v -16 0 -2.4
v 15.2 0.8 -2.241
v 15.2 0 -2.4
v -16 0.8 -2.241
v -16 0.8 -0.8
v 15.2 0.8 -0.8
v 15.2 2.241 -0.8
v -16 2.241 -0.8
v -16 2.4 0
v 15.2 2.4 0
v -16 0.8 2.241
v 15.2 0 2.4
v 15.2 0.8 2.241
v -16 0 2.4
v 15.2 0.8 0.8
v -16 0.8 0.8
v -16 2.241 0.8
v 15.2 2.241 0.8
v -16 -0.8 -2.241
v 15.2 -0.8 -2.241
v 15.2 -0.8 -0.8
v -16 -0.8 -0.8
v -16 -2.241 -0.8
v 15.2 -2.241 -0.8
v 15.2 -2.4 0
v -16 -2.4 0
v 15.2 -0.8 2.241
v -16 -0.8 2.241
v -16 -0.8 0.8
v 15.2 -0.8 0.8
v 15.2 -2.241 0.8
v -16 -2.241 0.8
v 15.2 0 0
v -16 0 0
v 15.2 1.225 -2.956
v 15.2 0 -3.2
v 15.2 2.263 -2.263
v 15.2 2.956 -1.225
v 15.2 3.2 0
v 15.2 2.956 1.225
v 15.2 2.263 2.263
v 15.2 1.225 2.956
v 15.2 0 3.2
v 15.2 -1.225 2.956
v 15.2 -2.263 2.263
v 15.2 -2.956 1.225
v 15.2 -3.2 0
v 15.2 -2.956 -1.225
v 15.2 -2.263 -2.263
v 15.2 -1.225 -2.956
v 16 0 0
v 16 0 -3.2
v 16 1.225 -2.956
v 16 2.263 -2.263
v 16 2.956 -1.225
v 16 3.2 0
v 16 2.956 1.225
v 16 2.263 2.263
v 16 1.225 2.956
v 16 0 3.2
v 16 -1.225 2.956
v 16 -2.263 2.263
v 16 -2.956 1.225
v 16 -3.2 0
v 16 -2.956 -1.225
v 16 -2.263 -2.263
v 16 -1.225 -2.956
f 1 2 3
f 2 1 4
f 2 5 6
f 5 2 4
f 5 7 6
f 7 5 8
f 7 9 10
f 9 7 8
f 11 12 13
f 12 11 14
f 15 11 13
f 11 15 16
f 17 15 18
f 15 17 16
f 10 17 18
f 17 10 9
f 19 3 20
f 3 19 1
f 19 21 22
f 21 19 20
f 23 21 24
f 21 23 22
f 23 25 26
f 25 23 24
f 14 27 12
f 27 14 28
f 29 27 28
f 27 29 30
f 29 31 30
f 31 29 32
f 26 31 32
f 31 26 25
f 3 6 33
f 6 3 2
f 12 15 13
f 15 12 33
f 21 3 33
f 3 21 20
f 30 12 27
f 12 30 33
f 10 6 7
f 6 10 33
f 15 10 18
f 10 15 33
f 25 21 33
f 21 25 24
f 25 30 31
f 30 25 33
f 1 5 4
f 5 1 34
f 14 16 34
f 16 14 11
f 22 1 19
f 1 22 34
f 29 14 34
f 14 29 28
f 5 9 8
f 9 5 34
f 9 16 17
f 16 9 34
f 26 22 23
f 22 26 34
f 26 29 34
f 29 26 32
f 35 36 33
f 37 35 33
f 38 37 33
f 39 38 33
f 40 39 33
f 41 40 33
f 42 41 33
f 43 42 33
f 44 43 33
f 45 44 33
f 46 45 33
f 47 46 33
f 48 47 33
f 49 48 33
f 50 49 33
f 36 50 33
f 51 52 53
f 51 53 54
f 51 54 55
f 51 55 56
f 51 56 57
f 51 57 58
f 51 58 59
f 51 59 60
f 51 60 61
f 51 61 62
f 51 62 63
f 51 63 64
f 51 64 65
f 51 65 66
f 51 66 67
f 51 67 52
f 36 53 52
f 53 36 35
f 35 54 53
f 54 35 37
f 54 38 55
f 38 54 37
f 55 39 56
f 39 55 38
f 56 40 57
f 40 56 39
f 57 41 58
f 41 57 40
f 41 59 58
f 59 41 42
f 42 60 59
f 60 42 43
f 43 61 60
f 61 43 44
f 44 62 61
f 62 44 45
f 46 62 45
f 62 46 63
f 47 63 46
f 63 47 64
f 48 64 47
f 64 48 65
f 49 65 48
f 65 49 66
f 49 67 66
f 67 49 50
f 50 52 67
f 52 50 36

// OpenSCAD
// file: ../p/stud3.scad
use <../lib.scad>
use <4-4cyli.scad>
use <4-4disc.scad>
use <4-4edge.scad>
$fa=1; $fs=0.2;
function ldraw_lib__stud3(realsolid=false) = realsolid ? 
    [openscad(translate([0,0,-eps()], o=cylinder(4+eps(), r=4)),2)] : [
// 0 Stud Tube Solid
// 0 Name: stud3.dat
// 0 Author: James Jessiman
// 0 !LDRAW_ORG Primitive UPDATE 2012-01
// 0 !LICENSE Licensed under CC BY 2.0 and CC BY 4.0 : see CAreadme.txt
// 
// 0 BFC CERTIFY CCW
  [0,"BFC","CERTIFY"],
  [0,"BFC","CCW"],
// 
// 0 !HISTORY 2002-04-04 [sbliss] Modified for BFC compliance
// 0 !HISTORY 2002-04-25 [PTadmin] Official Update 2002-02
// 0 !HISTORY 2007-06-24 [PTadmin] Header formatted for Contributor Agreement
// 0 !HISTORY 2008-07-01 [PTadmin] Official Update 2008-01
// 0 !HISTORY 2012-02-16 [Philo] Changed to CCW
// 0 !HISTORY 2012-03-30 [PTadmin] Official Update 2012-01
// 
// 
// 1 16 0 -4 0 4 0 0 0 1 0 0 0 4 4-4edge.dat
  [1,16,0,-4,0,4,0,0,0,1,0,0,0,4, ldraw_lib__4_4edge(realsolid)],
// 1 16 0 0 0 4 0 0 0 1 0 0 0 4 4-4edge.dat
  [1,16,0,0,0,4,0,0,0,1,0,0,0,4, ldraw_lib__4_4edge(realsolid)],
// 1 16 0 -4 0 4 0 0 0 1 0 0 0 4 4-4disc.dat
  [1,16,0,-4,0,4,0,0,0,1,0,0,0,4, ldraw_lib__4_4disc(realsolid)],
// 1 16 0 -4 0 4 0 0 0 4 0 0 0 4 4-4cyli.dat
  [1,16,0,-4,0,4,0,0,0,4,0,0,0,4, ldraw_lib__4_4cyli(realsolid)],
];
module ldraw_lib__stud3(step=0, col=false, unit=2/5, alt=false, line=0.2, solid=!$preview)
    makepoly(ldraw_lib__stud3(solid), step=step, col=col, unit=unit, alt=alt, line=line, solid=solid);
ldraw_lib__stud3(line=0.2);
// file: ../p/stud.scad
use <../lib.scad>
use <4-4cyli.scad>
use <4-4disc.scad>
use <4-4edge.scad>
$fa=1; $fs=0.2;
function ldraw_lib__stud(realsolid=false) = realsolid ? 
    [openscad(translate([0,0,-eps()], o=cylinder(4+eps(), r=6)),2)] : [
// 0 Stud
// 0 Name: stud.dat
// 0 Author: James Jessiman
// 0 !LDRAW_ORG Primitive UPDATE 2012-01
// 0 !LICENSE Licensed under CC BY 2.0 and CC BY 4.0 : see CAreadme.txt
// 
// 0 BFC CERTIFY CCW
  [0,"BFC","CERTIFY"],
  [0,"BFC","CCW"],
// 
// 0 !HISTORY 2002-04-04 [sbliss] Modified for BFC compliance
// 0 !HISTORY 2002-04-25 [PTadmin] Official Update 2002-02
// 0 !HISTORY 2007-06-24 [PTadmin] Header formatted for Contributor Agreement
// 0 !HISTORY 2008-07-01 [PTadmin] Official Update 2008-01
// 0 !HISTORY 2012-02-16 [Philo] Changed to CCW
// 0 !HISTORY 2012-03-30 [PTadmin] Official Update 2012-01
// 
// 
// 1 16 0 0 0 6 0 0 0 1 0 0 0 6 4-4edge.dat
  [1,16,0,0,0,6,0,0,0,1,0,0,0,6, ldraw_lib__4_4edge(realsolid)],
// 1 16 0 -4 0 6 0 0 0 1 0 0 0 6 4-4edge.dat
  [1,16,0,-4,0,6,0,0,0,1,0,0,0,6, ldraw_lib__4_4edge(realsolid)],
// 1 16 0 0 0 6 0 0 0 -4 0 0 0 6 4-4cyli.dat
  [1,16,0,0,0,6,0,0,0,-4,0,0,0,6, ldraw_lib__4_4cyli(realsolid)],
// 1 16 0 -4 0 6 0 0 0 1 0 0 0 6 4-4disc.dat
  [1,16,0,-4,0,6,0,0,0,1,0,0,0,6, ldraw_lib__4_4disc(realsolid)],
];
module ldraw_lib__stud(step=0, col=false, unit=2/5, alt=false, line=0.2, solid=!$preview)
    makepoly(ldraw_lib__stud(solid), step=step, col=col, unit=unit, alt=alt, line=line, solid=solid);
ldraw_lib__stud(line=0.2);
// file: ../p/box5.scad
use <../lib.scad>
$fa=1; $fs=0.2;
function ldraw_lib__box5(realsolid=false) = [
// 0 Box with 5 Faces and All Edges
// 0 Name: box5.dat
// 0 Author: James Jessiman
// 0 !LDRAW_ORG Primitive UPDATE 2012-01
// 0 !LICENSE Licensed under CC BY 2.0 and CC BY 4.0 : see CAreadme.txt
// 
// 0 BFC CERTIFY CCW
  [0,"BFC","CERTIFY"],
  [0,"BFC","CCW"],
// 
// 0 !HISTORY 2002-04-03 [sbliss] Modified for BFC compliance
// 0 !HISTORY 2002-04-25 [PTadmin] Official Update 2002-02
// 0 !HISTORY 2007-06-24 [PTadmin] Header formatted for Contributor Agreement
// 0 !HISTORY 2008-07-01 [PTadmin] Official Update 2008-01
// 0 !HISTORY 2012-02-16 [Philo] Changed to CCW
// 0 !HISTORY 2012-03-30 [PTadmin] Official Update 2012-01
// 
// 
// 2 24 1 1 1 -1 1 1
  [2,24,1,1,1,-1,1,1],
// 2 24 -1 1 1 -1 1 -1
  [2,24,-1,1,1,-1,1,-1],
// 2 24 -1 1 -1 1 1 -1
  [2,24,-1,1,-1,1,1,-1],
// 2 24 1 1 -1 1 1 1
  [2,24,1,1,-1,1,1,1],
// 2 24 1 0 1 -1 0 1
  [2,24,1,0,1,-1,0,1],
// 2 24 -1 0 1 -1 0 -1
  [2,24,-1,0,1,-1,0,-1],
// 2 24 -1 0 -1 1 0 -1
  [2,24,-1,0,-1,1,0,-1],
// 2 24 1 0 -1 1 0 1
  [2,24,1,0,-1,1,0,1],
// 2 24 1 0 1 1 1 1
  [2,24,1,0,1,1,1,1],
// 2 24 -1 0 1 -1 1 1
  [2,24,-1,0,1,-1,1,1],
// 2 24 1 0 -1 1 1 -1
  [2,24,1,0,-1,1,1,-1],
// 2 24 -1 0 -1 -1 1 -1
  [2,24,-1,0,-1,-1,1,-1],
// 4 16 -1 1 1 1 1 1 1 1 -1 -1 1 -1
  [4,16,-1,1,1,1,1,1,1,1,-1,-1,1,-1],
// 4 16 -1 1 1 -1 0 1 1 0 1 1 1 1
  [4,16,-1,1,1,-1,0,1,1,0,1,1,1,1],
// 4 16 -1 1 -1 -1 0 -1 -1 0 1 -1 1 1
  [4,16,-1,1,-1,-1,0,-1,-1,0,1,-1,1,1],
// 4 16 1 1 -1 1 0 -1 -1 0 -1 -1 1 -1
  [4,16,1,1,-1,1,0,-1,-1,0,-1,-1,1,-1],
// 4 16 1 1 1 1 0 1 1 0 -1 1 1 -1
  [4,16,1,1,1,1,0,1,1,0,-1,1,1,-1],
];
module ldraw_lib__box5(step=0, col=false, unit=2/5, alt=false, line=0.2, solid=!$preview)
    makepoly(ldraw_lib__box5(solid), step=step, col=col, unit=unit, alt=alt, line=line, solid=solid);
ldraw_lib__box5(line=0.2);
// file: ../p/box4t.scad
use <../lib.scad>
$fa=1; $fs=0.2;
function ldraw_lib__box4t(realsolid=false) = [
// 0 Box with 4 Adjacent Faces and All Edges
// 0 Name: box4t.dat
// 0 Author: Tore Eriksson [Tore_Eriksson]
// 0 !LDRAW_ORG Primitive UPDATE 2003-02
// 0 !LICENSE Licensed under CC BY 2.0 and CC BY 4.0 : see CAreadme.txt
// 
// 0 BFC CERTIFY CCW
  [0,"BFC","CERTIFY"],
  [0,"BFC","CCW"],
// 
// 0 !HISTORY 1997-09-29 [PTadmin] Official Update 1997-15
// 0 !HISTORY 2002-08-31 [izanette] Modified with WINDZ for BFC compliance
// 0 !HISTORY 2003-08-01 [PTadmin] Official Update 2003-02
// 0 !HISTORY 2007-06-24 [PTadmin] Header formatted for Contributor Agreement
// 0 !HISTORY 2008-07-01 [PTadmin] Official Update 2008-01
// 
// 
// 2 24 1 1 1 -1 1 1
  [2,24,1,1,1,-1,1,1],
// 2 24 -1 1 1 -1 1 -1
  [2,24,-1,1,1,-1,1,-1],
// 2 24 -1 1 -1 1 1 -1
  [2,24,-1,1,-1,1,1,-1],
// 2 24 1 1 -1 1 1 1
  [2,24,1,1,-1,1,1,1],
// 2 24 1 0 1 -1 0 1
  [2,24,1,0,1,-1,0,1],
// 2 24 -1 0 1 -1 0 -1
  [2,24,-1,0,1,-1,0,-1],
// 2 24 -1 0 -1 1 0 -1
  [2,24,-1,0,-1,1,0,-1],
// 2 24 1 0 -1 1 0 1
  [2,24,1,0,-1,1,0,1],
// 2 24 1 0 1 1 1 1
  [2,24,1,0,1,1,1,1],
// 2 24 -1 0 1 -1 1 1
  [2,24,-1,0,1,-1,1,1],
// 2 24 1 0 -1 1 1 -1
  [2,24,1,0,-1,1,1,-1],
// 2 24 -1 0 -1 -1 1 -1
  [2,24,-1,0,-1,-1,1,-1],
// 4 16 1 1 1 1 1 -1 -1 1 -1 -1 1 1
  [4,16,1,1,1,1,1,-1,-1,1,-1,-1,1,1],
// 4 16 1 1 1 -1 1 1 -1 0 1 1 0 1
  [4,16,1,1,1,-1,1,1,-1,0,1,1,0,1],
// 4 16 -1 1 1 -1 1 -1 -1 0 -1 -1 0 1
  [4,16,-1,1,1,-1,1,-1,-1,0,-1,-1,0,1],
// 0 4 16 -1 1 -1 -1 0 -1 1 0 -1 1 1 -1
// 4 16 1 1 -1 1 1 1 1 0 1 1 0 -1
  [4,16,1,1,-1,1,1,1,1,0,1,1,0,-1],
// 0
];
module ldraw_lib__box4t(step=0, col=false, unit=2/5, alt=false, line=0.2, solid=!$preview)
    makepoly(ldraw_lib__box4t(solid), step=step, col=col, unit=unit, alt=alt, line=line, solid=solid);
ldraw_lib__box4t(line=0.2);
// file: s/3004s01.scad
use <../../lib.scad>
use <../../p/box4t.scad>
use <../../p/box5.scad>
use <../../p/stud.scad>
use <../../p/stud3.scad>
$fa=1; $fs=0.2;
function ldraw_lib__s__3004s01(realsolid=false) = [
// 0 ~Brick  1 x  2 without Front Face
// 0 Name: s\3004s01.dat
// 0 Author: James Jessiman
// 0 !LDRAW_ORG Subpart UPDATE 2003-03
// 0 !LICENSE Licensed under CC BY 2.0 and CC BY 4.0 : see CAreadme.txt
// 
// 0 BFC CERTIFY CCW
  [0,"BFC","CERTIFY"],
  [0,"BFC","CCW"],
// 
// 0 !HISTORY 2003-09-07 [jriley] Subfiling, BFC
// 0 !HISTORY 2003-12-19 [PTadmin] Official Update 2003-03
// 0 !HISTORY 2007-08-29 [PTadmin] Header formatted for Contributor Agreement
// 0 !HISTORY 2008-07-01 [PTadmin] Official Update 2008-01
// 
// 
// 1 16 0 4 0 1 0 0 0 -5 0 0 0 1 stud3.dat
  [1,16,0,4,0,1,0,0,0,-5,0,0,0,1, ldraw_lib__stud3(realsolid)],
// 0 BFC INVERTNEXT
  [0,"BFC","INVERTNEXT"],
// 1 16 0 24 0 16 0 0 0 -20 0 0 0 6 box5.dat
  [1,16,0,24,0,16,0,0,0,-20,0,0,0,6, ldraw_lib__box5(realsolid)],
// 4 16 20 24 10 16 24 6 -16 24 6 -20 24 10
  [4,16,20,24,10,16,24,6,-16,24,6,-20,24,10],
// 4 16 -20 24 10 -16 24 6 -16 24 -6 -20 24 -10
  [4,16,-20,24,10,-16,24,6,-16,24,-6,-20,24,-10],
// 4 16 -20 24 -10 -16 24 -6 16 24 -6 20 24 -10
  [4,16,-20,24,-10,-16,24,-6,16,24,-6,20,24,-10],
// 4 16 20 24 -10 16 24 -6 16 24 6 20 24 10
  [4,16,20,24,-10,16,24,-6,16,24,6,20,24,10],
// 1 16 0 24 0 20 0 0 0 -24 0 0 0 10 box4t.dat
  [1,16,0,24,0,20,0,0,0,-24,0,0,0,10, ldraw_lib__box4t(realsolid)],
// 1 16 10 0 0 1 0 0 0 1 0 0 0 1 stud.dat
  [1,16,10,0,0,1,0,0,0,1,0,0,0,1, ldraw_lib__stud(realsolid)],
// 1 16 -10 0 0 1 0 0 0 1 0 0 0 1 stud.dat
  [1,16,-10,0,0,1,0,0,0,1,0,0,0,1, ldraw_lib__stud(realsolid)],
// 0
];
module ldraw_lib__s__3004s01(step=0, col=false, unit=2/5, alt=false, line=0.2, solid=!$preview)
    makepoly(ldraw_lib__s__3004s01(solid), step=step, col=col, unit=unit, alt=alt, line=line, solid=solid);
ldraw_lib__s__3004s01(line=0.2);
// file: ../p/4-4edge.scad
use <../lib.scad>
$fa=1; $fs=0.2;
function ldraw_lib__4_4edge(realsolid=false) = [
// 0 Circle 1.0
// 0 Name: 4-4edge.dat
// 0 Author: James Jessiman
// 0 !LDRAW_ORG Primitive UPDATE 2017-01
// 0 !LICENSE Licensed under CC BY 2.0 and CC BY 4.0 : see CAreadme.txt
// 
// 0 BFC CERTIFY CCW
  [0,"BFC","CERTIFY"],
  [0,"BFC","CCW"],
// 
// 0 !HISTORY 1998-12-15 [PTadmin] Official Update 1998-10
// 0 !HISTORY 2005-12-28 [PTadmin] Official Update 2005-01
// 0 !HISTORY 2007-06-24 [PTadmin] Header formatted for Contributor Agreement
// 0 !HISTORY 2008-07-01 [PTadmin] Official Update 2008-01
// 0 !HISTORY 2017-01-15 [Steffen] BFCed
// 0 !HISTORY 2017-12-30 [PTadmin] Official Update 2017-01
// 
// 
// 2 24 1 0 0 0.9239 0 0.3827
  [2,24,1,0,0,0.9239,0,0.3827],
// 2 24 0.9239 0 0.3827 0.7071 0 0.7071
  [2,24,0.9239,0,0.3827,0.7071,0,0.7071],
// 2 24 0.7071 0 0.7071 0.3827 0 0.9239
  [2,24,0.7071,0,0.7071,0.3827,0,0.9239],
// 2 24 0.3827 0 0.9239 0 0 1
  [2,24,0.3827,0,0.9239,0,0,1],
// 2 24 0 0 1 -0.3827 0 0.9239
  [2,24,0,0,1,-0.3827,0,0.9239],
// 2 24 -0.3827 0 0.9239 -0.7071 0 0.7071
  [2,24,-0.3827,0,0.9239,-0.7071,0,0.7071],
// 2 24 -0.7071 0 0.7071 -0.9239 0 0.3827
  [2,24,-0.7071,0,0.7071,-0.9239,0,0.3827],
// 2 24 -0.9239 0 0.3827 -1 0 -0
  [2,24,-0.9239,0,0.3827,-1,0,-0],
// 2 24 -1 0 -0 -0.9239 0 -0.3827
  [2,24,-1,0,-0,-0.9239,0,-0.3827],
// 2 24 -0.9239 0 -0.3827 -0.7071 0 -0.7071
  [2,24,-0.9239,0,-0.3827,-0.7071,0,-0.7071],
// 2 24 -0.7071 0 -0.7071 -0.3827 0 -0.9239
  [2,24,-0.7071,0,-0.7071,-0.3827,0,-0.9239],
// 2 24 -0.3827 0 -0.9239 0 0 -1
  [2,24,-0.3827,0,-0.9239,0,0,-1],
// 2 24 0 0 -1 0.3827 0 -0.9239
  [2,24,0,0,-1,0.3827,0,-0.9239],
// 2 24 0.3827 0 -0.9239 0.7071 0 -0.7071
  [2,24,0.3827,0,-0.9239,0.7071,0,-0.7071],
// 2 24 0.7071 0 -0.7071 0.9239 0 -0.3827
  [2,24,0.7071,0,-0.7071,0.9239,0,-0.3827],
// 2 24 0.9239 0 -0.3827 1 0 0
  [2,24,0.9239,0,-0.3827,1,0,0],
];
module ldraw_lib__4_4edge(step=0, col=false, unit=2/5, alt=false, line=0.2, solid=!$preview)
    makepoly(ldraw_lib__4_4edge(solid), step=step, col=col, unit=unit, alt=alt, line=line, solid=solid);
ldraw_lib__4_4edge(line=0.2);
// file: ../p/4-4cyli.scad
use <../lib.scad>
$fa=1; $fs=0.2;
function ldraw_lib__4_4cyli(realsolid=false) = [
// 0 Cylinder 1.0
// 0 Name: 4-4cyli.dat
// 0 Author: James Jessiman
// 0 !LDRAW_ORG Primitive UPDATE 2005-01
// 0 !LICENSE Licensed under CC BY 2.0 and CC BY 4.0 : see CAreadme.txt
// 
// 0 BFC CERTIFY CCW
  [0,"BFC","CERTIFY"],
  [0,"BFC","CCW"],
// 
// 0 !HISTORY 1998-12-15 [PTadmin] Official Update 1998-10
// 0 !HISTORY 2002-03-23 [sbliss] Added BFC statement; merged headers from files in distributions LDraw 0.27 and Complete.
// 0 !HISTORY 2002-04-25 [PTadmin] Official Update 2002-02
// 0 !HISTORY 2004-12-14 [guyvivan] BFC CCW
// 0 !HISTORY 2005-12-28 [PTadmin] Official Update 2005-01
// 0 !HISTORY 2007-06-24 [PTadmin] Header formatted for Contributor Agreement
// 0 !HISTORY 2008-07-01 [PTadmin] Official Update 2008-01
// 
// 
// 4 16 1 1 0 0.9239 1 0.3827 0.9239 0 0.3827 1 0 0
  [4,16,1,1,0,0.9239,1,0.3827,0.9239,0,0.3827,1,0,0],
// 5 24 1 0 0 1 1 0 0.9239 0 0.3827 0.9239 0 -0.3827
  [5,24,1,0,0,1,1,0,0.9239,0,0.3827,0.9239,0,-0.3827],
// 4 16 0.9239 1 0.3827 0.7071 1 0.7071 0.7071 0 0.7071 0.9239 0 0.3827
  [4,16,0.9239,1,0.3827,0.7071,1,0.7071,0.7071,0,0.7071,0.9239,0,0.3827],
// 5 24 0.9239 0 0.3827 0.9239 1 0.3827 0.7071 0 0.7071 1 0 0
  [5,24,0.9239,0,0.3827,0.9239,1,0.3827,0.7071,0,0.7071,1,0,0],
// 4 16 0.7071 1 0.7071 0.3827 1 0.9239 0.3827 0 0.9239 0.7071 0 0.7071
  [4,16,0.7071,1,0.7071,0.3827,1,0.9239,0.3827,0,0.9239,0.7071,0,0.7071],
// 5 24 0.7071 0 0.7071 0.7071 1 0.7071 0.3827 0 0.9239 0.9239 0 0.3827
  [5,24,0.7071,0,0.7071,0.7071,1,0.7071,0.3827,0,0.9239,0.9239,0,0.3827],
// 4 16 0.3827 1 0.9239 0 1 1 0 0 1 0.3827 0 0.9239
  [4,16,0.3827,1,0.9239,0,1,1,0,0,1,0.3827,0,0.9239],
// 5 24 0.3827 0 0.9239 0.3827 1 0.9239 0 0 1 0.7071 0 0.7071
  [5,24,0.3827,0,0.9239,0.3827,1,0.9239,0,0,1,0.7071,0,0.7071],
// 4 16 0 1 1 -0.3827 1 0.9239 -0.3827 0 0.9239 0 0 1
  [4,16,0,1,1,-0.3827,1,0.9239,-0.3827,0,0.9239,0,0,1],
// 5 24 0 0 1 0 1 1 -0.3827 0 0.9239 0.3827 0 0.9239
  [5,24,0,0,1,0,1,1,-0.3827,0,0.9239,0.3827,0,0.9239],
// 4 16 -0.3827 1 0.9239 -0.7071 1 0.7071 -0.7071 0 0.7071 -0.3827 0 0.9239
  [4,16,-0.3827,1,0.9239,-0.7071,1,0.7071,-0.7071,0,0.7071,-0.3827,0,0.9239],
// 5 24 -0.3827 0 0.9239 -0.3827 1 0.9239 -0.7071 0 0.7071 0 0 1
  [5,24,-0.3827,0,0.9239,-0.3827,1,0.9239,-0.7071,0,0.7071,0,0,1],
// 4 16 -0.7071 1 0.7071 -0.9239 1 0.3827 -0.9239 0 0.3827 -0.7071 0 0.7071
  [4,16,-0.7071,1,0.7071,-0.9239,1,0.3827,-0.9239,0,0.3827,-0.7071,0,0.7071],
// 5 24 -0.7071 0 0.7071 -0.7071 1 0.7071 -0.9239 0 0.3827 -0.3827 0 0.9239
  [5,24,-0.7071,0,0.7071,-0.7071,1,0.7071,-0.9239,0,0.3827,-0.3827,0,0.9239],
// 4 16 -0.9239 1 0.3827 -1 1 0 -1 0 0 -0.9239 0 0.3827
  [4,16,-0.9239,1,0.3827,-1,1,0,-1,0,0,-0.9239,0,0.3827],
// 5 24 -0.9239 0 0.3827 -0.9239 1 0.3827 -1 0 0 -0.7071 0 0.7071
  [5,24,-0.9239,0,0.3827,-0.9239,1,0.3827,-1,0,0,-0.7071,0,0.7071],
// 4 16 -1 1 0 -0.9239 1 -0.3827 -0.9239 0 -0.3827 -1 0 0
  [4,16,-1,1,0,-0.9239,1,-0.3827,-0.9239,0,-0.3827,-1,0,0],
// 5 24 -1 0 0 -1 1 0 -0.9239 0 -0.3827 -0.9239 0 0.3827
  [5,24,-1,0,0,-1,1,0,-0.9239,0,-0.3827,-0.9239,0,0.3827],
// 4 16 -0.9239 1 -0.3827 -0.7071 1 -0.7071 -0.7071 0 -0.7071 -0.9239 0 -0.3827
  [4,16,-0.9239,1,-0.3827,-0.7071,1,-0.7071,-0.7071,0,-0.7071,-0.9239,0,-0.3827],
// 5 24 -0.9239 0 -0.3827 -0.9239 1 -0.3827 -0.7071 0 -0.7071 -1 0 0
  [5,24,-0.9239,0,-0.3827,-0.9239,1,-0.3827,-0.7071,0,-0.7071,-1,0,0],
// 4 16 -0.7071 1 -0.7071 -0.3827 1 -0.9239 -0.3827 0 -0.9239 -0.7071 0 -0.7071
  [4,16,-0.7071,1,-0.7071,-0.3827,1,-0.9239,-0.3827,0,-0.9239,-0.7071,0,-0.7071],
// 5 24 -0.7071 0 -0.7071 -0.7071 1 -0.7071 -0.3827 0 -0.9239 -0.9239 0 -0.3827
  [5,24,-0.7071,0,-0.7071,-0.7071,1,-0.7071,-0.3827,0,-0.9239,-0.9239,0,-0.3827],
// 4 16 -0.3827 1 -0.9239 0 1 -1 0 0 -1 -0.3827 0 -0.9239
  [4,16,-0.3827,1,-0.9239,0,1,-1,0,0,-1,-0.3827,0,-0.9239],
// 5 24 -0.3827 0 -0.9239 -0.3827 1 -0.9239 0 0 -1 -0.7071 0 -0.7071
  [5,24,-0.3827,0,-0.9239,-0.3827,1,-0.9239,0,0,-1,-0.7071,0,-0.7071],
// 4 16 0 1 -1 0.3827 1 -0.9239 0.3827 0 -0.9239 0 0 -1
  [4,16,0,1,-1,0.3827,1,-0.9239,0.3827,0,-0.9239,0,0,-1],
// 5 24 0 0 -1 0 1 -1 0.3827 0 -0.9239 -0.3827 0 -0.9239
  [5,24,0,0,-1,0,1,-1,0.3827,0,-0.9239,-0.3827,0,-0.9239],
// 4 16 0.3827 1 -0.9239 0.7071 1 -0.7071 0.7071 0 -0.7071 0.3827 0 -0.9239
  [4,16,0.3827,1,-0.9239,0.7071,1,-0.7071,0.7071,0,-0.7071,0.3827,0,-0.9239],
// 5 24 0.3827 0 -0.9239 0.3827 1 -0.9239 0.7071 0 -0.7071 0 0 -1
  [5,24,0.3827,0,-0.9239,0.3827,1,-0.9239,0.7071,0,-0.7071,0,0,-1],
// 4 16 0.7071 1 -0.7071 0.9239 1 -0.3827 0.9239 0 -0.3827 0.7071 0 -0.7071
  [4,16,0.7071,1,-0.7071,0.9239,1,-0.3827,0.9239,0,-0.3827,0.7071,0,-0.7071],
// 5 24 0.7071 0 -0.7071 0.7071 1 -0.7071 0.9239 0 -0.3827 0.3827 0 -0.9239
  [5,24,0.7071,0,-0.7071,0.7071,1,-0.7071,0.9239,0,-0.3827,0.3827,0,-0.9239],
// 4 16 0.9239 1 -0.3827 1 1 0 1 0 0 0.9239 0 -0.3827
  [4,16,0.9239,1,-0.3827,1,1,0,1,0,0,0.9239,0,-0.3827],
// 5 24 0.9239 0 -0.3827 0.9239 1 -0.3827 1 0 0 0.7071 0 -0.7071
  [5,24,0.9239,0,-0.3827,0.9239,1,-0.3827,1,0,0,0.7071,0,-0.7071],
// 0
];
module ldraw_lib__4_4cyli(step=0, col=false, unit=2/5, alt=false, line=0.2, solid=!$preview)
    makepoly(ldraw_lib__4_4cyli(solid), step=step, col=col, unit=unit, alt=alt, line=line, solid=solid);
ldraw_lib__4_4cyli(line=0.2);
// file: 3004.scad
use <../lib.scad>
use <s/3004s01.scad>
$fa=1; $fs=0.2;
function ldraw_lib__3004(realsolid=false) = [
// 0 Brick  1 x  2
// 0 Name: 3004.dat
// 0 Author: James Jessiman
// 0 !LDRAW_ORG Part UPDATE 2022-05
// 0 !LICENSE Licensed under CC BY 2.0 and CC BY 4.0 : see CAreadme.txt
// 
// 0 BFC CERTIFY CCW
  [0,"BFC","CERTIFY"],
  [0,"BFC","CCW"],
// 
// 0 !HISTORY 2001-10-26 [PTadmin] Official Update 2001-01
// 0 !HISTORY 2002-05-07 {unknown} BFC Certification
// 0 !HISTORY 2002-06-11 [PTadmin] Official Update 2002-03
// 0 !HISTORY 2007-05-07 [PTadmin] Header formatted for Contributor Agreement
// 0 !HISTORY 2008-07-01 [PTadmin] Official Update 2008-01
// 0 !HISTORY 2022-08-04 [MagFors] Using subfile
// 0 !HISTORY 2022-09-15 [PTadmin] Official Update 2022-05
// 
// 
// 1 16 0 0 0 1 0 0 0 1 0 0 0 1 s\3004s01.dat
  [1,16,0,0,0,1,0,0,0,1,0,0,0,1, ldraw_lib__s__3004s01(realsolid)],
// 4 16 -20 24 -10 20 24 -10 20 0 -10 -20 0 -10
  [4,16,-20,24,-10,20,24,-10,20,0,-10,-20,0,-10],
];
module ldraw_lib__3004(step=0, col=false, unit=2/5, alt=false, line=0.2, solid=!$preview)
    makepoly(ldraw_lib__3004(solid), step=step, col=col, unit=unit, alt=alt, line=line, solid=solid);
ldraw_lib__3004(line=0.2);
// file: ../p/axle.scad
use <../lib.scad>
$fa=1; $fs=0.2;
function ldraw_lib__axle(realsolid=false) = [
// 0 Axle
// 0 Name: axle.dat
// 0 Author: James Jessiman
// 0 !LDRAW_ORG Primitive UPDATE 2003-01
// 0 !LICENSE Licensed under CC BY 2.0 and CC BY 4.0 : see CAreadme.txt
// 
// 0 BFC CERTIFY CCW
  [0,"BFC","CERTIFY"],
  [0,"BFC","CCW"],
// 
// 0 !HISTORY 2000-04-23 [sbliss] Added conditional edges along outermost diameters
// 0 !HISTORY 2000-05-07 [PTadmin] Official Update 2000-01
// 0 !HISTORY 2002-11-08 [OrionP] Adjusted fit and precision
// 0 !HISTORY 2003-03-12 [PTadmin] Official Update 2003-01
// 0 !HISTORY 2007-06-24 [PTadmin] Header formatted for Contributor Agreement
// 0 !HISTORY 2008-07-01 [PTadmin] Official Update 2008-01
// 
// 
// 5 24 6 0 0 6 1 0 5.602 0 2 5.602 0 -2
  [5,24,6,0,0,6,1,0,5.602,0,2,5.602,0,-2],
// 5 24 0 0 6 0 1 6 2 0 5.602 -2 0 5.602
  [5,24,0,0,6,0,1,6,2,0,5.602,-2,0,5.602],
// 5 24 -6 0 0 -6 1 0 -5.602 0 -2 -5.602 0 2
  [5,24,-6,0,0,-6,1,0,-5.602,0,-2,-5.602,0,2],
// 5 24 0 0 -6 0 1 -6 -2 0 -5.602 2 0 -5.602
  [5,24,0,0,-6,0,1,-6,-2,0,-5.602,2,0,-5.602],
// 
// 2 24 6 0 0 5.602 0 2
  [2,24,6,0,0,5.602,0,2],
// 2 24 5.602 0 2 2 0 2
  [2,24,5.602,0,2,2,0,2],
// 2 24 2 0 2 2 0 5.602
  [2,24,2,0,2,2,0,5.602],
// 2 24 2 0 5.602 0 0 6
  [2,24,2,0,5.602,0,0,6],
// 2 24 -6 0 0 -5.602 0 2
  [2,24,-6,0,0,-5.602,0,2],
// 2 24 -5.602 0 2 -2 0 2
  [2,24,-5.602,0,2,-2,0,2],
// 2 24 -2 0 2 -2 0 5.602
  [2,24,-2,0,2,-2,0,5.602],
// 2 24 -2 0 5.602 -0 0 6
  [2,24,-2,0,5.602,-0,0,6],
// 2 24 6 0 -0 5.602 0 -2
  [2,24,6,0,-0,5.602,0,-2],
// 2 24 5.602 0 -2 2 0 -2
  [2,24,5.602,0,-2,2,0,-2],
// 2 24 2 0 -2 2 0 -5.602
  [2,24,2,0,-2,2,0,-5.602],
// 2 24 2 0 -5.602 0 0 -6
  [2,24,2,0,-5.602,0,0,-6],
// 2 24 -6 0 -0 -5.602 0 -2
  [2,24,-6,0,-0,-5.602,0,-2],
// 2 24 -5.602 0 -2 -2 0 -2
  [2,24,-5.602,0,-2,-2,0,-2],
// 2 24 -2 0 -2 -2 0 -5.602
  [2,24,-2,0,-2,-2,0,-5.602],
// 2 24 -2 0 -5.602 -0 0 -6
  [2,24,-2,0,-5.602,-0,0,-6],
// 2 24 6 1 0 5.602 1 2
  [2,24,6,1,0,5.602,1,2],
// 2 24 5.602 1 2 2 1 2
  [2,24,5.602,1,2,2,1,2],
// 2 24 2 1 2 2 1 5.602
  [2,24,2,1,2,2,1,5.602],
// 2 24 2 1 5.602 0 1 6
  [2,24,2,1,5.602,0,1,6],
// 2 24 -6 1 0 -5.602 1 2
  [2,24,-6,1,0,-5.602,1,2],
// 2 24 -5.602 1 2 -2 1 2
  [2,24,-5.602,1,2,-2,1,2],
// 2 24 -2 1 2 -2 1 5.602
  [2,24,-2,1,2,-2,1,5.602],
// 2 24 -2 1 5.602 -0 1 6
  [2,24,-2,1,5.602,-0,1,6],
// 2 24 6 1 -0 5.602 1 -2
  [2,24,6,1,-0,5.602,1,-2],
// 2 24 5.602 1 -2 2 1 -2
  [2,24,5.602,1,-2,2,1,-2],
// 2 24 2 1 -2 2 1 -5.602
  [2,24,2,1,-2,2,1,-5.602],
// 2 24 2 1 -5.602 0 1 -6
  [2,24,2,1,-5.602,0,1,-6],
// 2 24 -6 1 -0 -5.602 1 -2
  [2,24,-6,1,-0,-5.602,1,-2],
// 2 24 -5.602 1 -2 -2 1 -2
  [2,24,-5.602,1,-2,-2,1,-2],
// 2 24 -2 1 -2 -2 1 -5.602
  [2,24,-2,1,-2,-2,1,-5.602],
// 2 24 -2 1 -5.602 -0 1 -6
  [2,24,-2,1,-5.602,-0,1,-6],
// 
// 2 24 5.602 0 2 5.602 1 2
  [2,24,5.602,0,2,5.602,1,2],
// 2 24 2 0 2 2 1 2
  [2,24,2,0,2,2,1,2],
// 2 24 2 0 5.602 2 1 5.602
  [2,24,2,0,5.602,2,1,5.602],
// 2 24 -5.602 0 2 -5.602 1 2
  [2,24,-5.602,0,2,-5.602,1,2],
// 2 24 -2 0 2 -2 1 2
  [2,24,-2,0,2,-2,1,2],
// 2 24 -2 0 5.602 -2 1 5.602
  [2,24,-2,0,5.602,-2,1,5.602],
// 2 24 5.602 0 -2 5.602 1 -2
  [2,24,5.602,0,-2,5.602,1,-2],
// 2 24 2 0 -2 2 1 -2
  [2,24,2,0,-2,2,1,-2],
// 2 24 2 0 -5.602 2 1 -5.602
  [2,24,2,0,-5.602,2,1,-5.602],
// 2 24 -5.602 0 -2 -5.602 1 -2
  [2,24,-5.602,0,-2,-5.602,1,-2],
// 2 24 -2 0 -2 -2 1 -2
  [2,24,-2,0,-2,-2,1,-2],
// 2 24 -2 0 -5.602 -2 1 -5.602
  [2,24,-2,0,-5.602,-2,1,-5.602],
// 
// 4 16 6 0 0 6 1 0 5.602 1 2 5.602 0 2
  [4,16,6,0,0,6,1,0,5.602,1,2,5.602,0,2],
// 4 16 5.602 0 2 5.602 1 2 2 1 2 2 0 2
  [4,16,5.602,0,2,5.602,1,2,2,1,2,2,0,2],
// 4 16 2 0 2 2 1 2 2 1 5.602 2 0 5.602
  [4,16,2,0,2,2,1,2,2,1,5.602,2,0,5.602],
// 4 16 2 0 5.602 2 1 5.602 0 1 6 0 0 6
  [4,16,2,0,5.602,2,1,5.602,0,1,6,0,0,6],
// 4 16 -6 0 0 -5.602 0 2 -5.602 1 2 -6 1 0
  [4,16,-6,0,0,-5.602,0,2,-5.602,1,2,-6,1,0],
// 4 16 -5.602 0 2 -2 0 2 -2 1 2 -5.602 1 2
  [4,16,-5.602,0,2,-2,0,2,-2,1,2,-5.602,1,2],
// 4 16 -2 0 2 -2 0 5.602 -2 1 5.602 -2 1 2
  [4,16,-2,0,2,-2,0,5.602,-2,1,5.602,-2,1,2],
// 4 16 -2 0 5.602 -0 0 6 -0 1 6 -2 1 5.602
  [4,16,-2,0,5.602,-0,0,6,-0,1,6,-2,1,5.602],
// 4 16 6 0 -0 5.602 0 -2 5.602 1 -2 6 1 -0
  [4,16,6,0,-0,5.602,0,-2,5.602,1,-2,6,1,-0],
// 4 16 5.602 0 -2 2 0 -2 2 1 -2 5.602 1 -2
  [4,16,5.602,0,-2,2,0,-2,2,1,-2,5.602,1,-2],
// 4 16 2 0 -2 2 0 -5.602 2 1 -5.602 2 1 -2
  [4,16,2,0,-2,2,0,-5.602,2,1,-5.602,2,1,-2],
// 4 16 2 0 -5.602 0 0 -6 0 1 -6 2 1 -5.602
  [4,16,2,0,-5.602,0,0,-6,0,1,-6,2,1,-5.602],
// 4 16 -6 0 -0 -6 1 -0 -5.602 1 -2 -5.602 0 -2
  [4,16,-6,0,-0,-6,1,-0,-5.602,1,-2,-5.602,0,-2],
// 4 16 -5.602 0 -2 -5.602 1 -2 -2 1 -2 -2 0 -2
  [4,16,-5.602,0,-2,-5.602,1,-2,-2,1,-2,-2,0,-2],
// 4 16 -2 0 -2 -2 1 -2 -2 1 -5.602 -2 0 -5.602
  [4,16,-2,0,-2,-2,1,-2,-2,1,-5.602,-2,0,-5.602],
// 4 16 -2 0 -5.602 -2 1 -5.602 -0 1 -6 -0 0 -6
  [4,16,-2,0,-5.602,-2,1,-5.602,-0,1,-6,-0,0,-6],
// 
// 4 16 6 0 0 5.602 0 2 2 0 2 0 0 0
  [4,16,6,0,0,5.602,0,2,2,0,2,0,0,0],
// 4 16 -6 0 0 0 0 0 -2 0 2 -5.602 0 2
  [4,16,-6,0,0,0,0,0,-2,0,2,-5.602,0,2],
// 4 16 6 0 0 0 0 0 2 0 -2 5.602 0 -2
  [4,16,6,0,0,0,0,0,2,0,-2,5.602,0,-2],
// 4 16 -6 0 0 -5.602 0 -2 -2 0 -2 0 0 0
  [4,16,-6,0,0,-5.602,0,-2,-2,0,-2,0,0,0],
// 4 16 0 0 6 0 0 0 2 0 2 2 0 5.602
  [4,16,0,0,6,0,0,0,2,0,2,2,0,5.602],
// 4 16 0 0 6 -2 0 5.602 -2 0 2 0 0 0
  [4,16,0,0,6,-2,0,5.602,-2,0,2,0,0,0],
// 4 16 0 0 -6 2 0 -5.602 2 0 -2 0 0 0
  [4,16,0,0,-6,2,0,-5.602,2,0,-2,0,0,0],
// 4 16 0 0 -6 0 0 0 -2 0 -2 -2 0 -5.602
  [4,16,0,0,-6,0,0,0,-2,0,-2,-2,0,-5.602],
// 4 16 6 1 0 0 1 0 2 1 2 5.602 1 2
  [4,16,6,1,0,0,1,0,2,1,2,5.602,1,2],
// 4 16 -6 1 0 -5.602 1 2 -2 1 2 0 1 0
  [4,16,-6,1,0,-5.602,1,2,-2,1,2,0,1,0],
// 4 16 6 1 0 5.602 1 -2 2 1 -2 0 1 0
  [4,16,6,1,0,5.602,1,-2,2,1,-2,0,1,0],
// 4 16 -6 1 0 0 1 0 -2 1 -2 -5.602 1 -2
  [4,16,-6,1,0,0,1,0,-2,1,-2,-5.602,1,-2],
// 4 16 0 1 6 2 1 5.602 2 1 2 0 1 0
  [4,16,0,1,6,2,1,5.602,2,1,2,0,1,0],
// 4 16 0 1 6 0 1 0 -2 1 2 -2 1 5.602
  [4,16,0,1,6,0,1,0,-2,1,2,-2,1,5.602],
// 4 16 0 1 -6 0 1 0 2 1 -2 2 1 -5.602
  [4,16,0,1,-6,0,1,0,2,1,-2,2,1,-5.602],
// 4 16 0 1 -6 -2 1 -5.602 -2 1 -2 0 1 0
  [4,16,0,1,-6,-2,1,-5.602,-2,1,-2,0,1,0],
// 0
];
module ldraw_lib__axle(step=0, col=false, unit=2/5, alt=false, line=0.2, solid=!$preview)
    makepoly(ldraw_lib__axle(solid), step=step, col=col, unit=unit, alt=alt, line=line, solid=solid);
ldraw_lib__axle(line=0.2);
// file: ../p/4-4disc.scad
use <../lib.scad>
$fa=1; $fs=0.2;
function ldraw_lib__4_4disc(realsolid=false) = [
// 0 Disc 1.0
// 0 Name: 4-4disc.dat
// 0 Author: James Jessiman
// 0 !LDRAW_ORG Primitive UPDATE 2002-02
// 0 !LICENSE Licensed under CC BY 2.0 and CC BY 4.0 : see CAreadme.txt
// 
// 0 BFC CERTIFY CCW
  [0,"BFC","CERTIFY"],
  [0,"BFC","CCW"],
// 
// 0 !HISTORY 1998-12-15 [PTadmin] Official Update 1998-10
// 0 !HISTORY 2002-03-23 [sbliss] Added BFC statement
// 0 !HISTORY 2002-04-25 [PTadmin] Official Update 2002-02
// 0 !HISTORY 2007-06-24 [PTadmin] Header formatted for Contributor Agreement
// 0 !HISTORY 2008-07-01 [PTadmin] Official Update 2008-01
// 
// 
// 3 16 0 0 0 1 0 0 0.9239 0 0.3827
  [3,16,0,0,0,1,0,0,0.9239,0,0.3827],
// 3 16 0 0 0 0.9239 0 0.3827 0.7071 0 0.7071
  [3,16,0,0,0,0.9239,0,0.3827,0.7071,0,0.7071],
// 3 16 0 0 0 0.7071 0 0.7071 0.3827 0 0.9239
  [3,16,0,0,0,0.7071,0,0.7071,0.3827,0,0.9239],
// 3 16 0 0 0 0.3827 0 0.9239 0 0 1
  [3,16,0,0,0,0.3827,0,0.9239,0,0,1],
// 3 16 0 0 0 0 0 1 -0.3827 0 0.9239
  [3,16,0,0,0,0,0,1,-0.3827,0,0.9239],
// 3 16 0 0 0 -0.3827 0 0.9239 -0.7071 0 0.7071
  [3,16,0,0,0,-0.3827,0,0.9239,-0.7071,0,0.7071],
// 3 16 0 0 0 -0.7071 0 0.7071 -0.9239 0 0.3827
  [3,16,0,0,0,-0.7071,0,0.7071,-0.9239,0,0.3827],
// 3 16 0 0 0 -0.9239 0 0.3827 -1 0 -0
  [3,16,0,0,0,-0.9239,0,0.3827,-1,0,-0],
// 3 16 0 0 0 -1 0 -0 -0.9239 0 -0.3827
  [3,16,0,0,0,-1,0,-0,-0.9239,0,-0.3827],
// 3 16 0 0 0 -0.9239 0 -0.3827 -0.7071 0 -0.7071
  [3,16,0,0,0,-0.9239,0,-0.3827,-0.7071,0,-0.7071],
// 3 16 0 0 0 -0.7071 0 -0.7071 -0.3827 0 -0.9239
  [3,16,0,0,0,-0.7071,0,-0.7071,-0.3827,0,-0.9239],
// 3 16 0 0 0 -0.3827 0 -0.9239 0 0 -1
  [3,16,0,0,0,-0.3827,0,-0.9239,0,0,-1],
// 3 16 0 0 0 0 0 -1 0.3827 0 -0.9239
  [3,16,0,0,0,0,0,-1,0.3827,0,-0.9239],
// 3 16 0 0 0 0.3827 0 -0.9239 0.7071 0 -0.7071
  [3,16,0,0,0,0.3827,0,-0.9239,0.7071,0,-0.7071],
// 3 16 0 0 0 0.7071 0 -0.7071 0.9239 0 -0.3827
  [3,16,0,0,0,0.7071,0,-0.7071,0.9239,0,-0.3827],
// 3 16 0 0 0 0.9239 0 -0.3827 1 0 0
  [3,16,0,0,0,0.9239,0,-0.3827,1,0,0],
// 0
];
module ldraw_lib__4_4disc(step=0, col=false, unit=2/5, alt=false, line=0.2, solid=!$preview)
    makepoly(ldraw_lib__4_4disc(solid), step=step, col=col, unit=unit, alt=alt, line=line, solid=solid);
ldraw_lib__4_4disc(line=0.2);
// file: ../p/4-4cylc.scad
use <../lib.scad>
use <4-4cyli.scad>
use <4-4disc.scad>
use <4-4edge.scad>
$fa=1; $fs=0.2;
function ldraw_lib__4_4cylc(realsolid=false) = [
// 0 Cylinder Closed 1.0
// 0 Name: 4-4cylc.dat
// 0 Author: Alex Taylor [anathema]
// 0 !LDRAW_ORG Primitive UPDATE 2009-02
// 0 !LICENSE Licensed under CC BY 2.0 and CC BY 4.0 : see CAreadme.txt
// 
// 0 BFC CERTIFY CCW
  [0,"BFC","CERTIFY"],
  [0,"BFC","CCW"],
// 
// 0 !HISTORY 2008-12-29 [cwdee] Removed one disc
// 0 !HISTORY 2009-09-03 [PTadmin] Official Update 2009-02
// 
// 
// 1 16 0 0 0 1 0 0 0 1 0 0 0 1 4-4edge.dat
  [1,16,0,0,0,1,0,0,0,1,0,0,0,1, ldraw_lib__4_4edge(realsolid)],
// 1 16 0 1 0 1 0 0 0 1 0 0 0 1 4-4edge.dat
  [1,16,0,1,0,1,0,0,0,1,0,0,0,1, ldraw_lib__4_4edge(realsolid)],
// 1 16 0 0 0 1 0 0 0 1 0 0 0 1 4-4disc.dat
  [1,16,0,0,0,1,0,0,0,1,0,0,0,1, ldraw_lib__4_4disc(realsolid)],
// 1 16 0 0 0 1 0 0 0 1 0 0 0 1 4-4cyli.dat
  [1,16,0,0,0,1,0,0,0,1,0,0,0,1, ldraw_lib__4_4cyli(realsolid)],
// 0
];
module ldraw_lib__4_4cylc(step=0, col=false, unit=2/5, alt=false, line=0.2, solid=!$preview)
    makepoly(ldraw_lib__4_4cylc(solid), step=step, col=col, unit=unit, alt=alt, line=line, solid=solid);
ldraw_lib__4_4cylc(line=0.2);
// main file
use <../lib.scad>
use <../p/4-4cylc.scad>
use <../p/4-4disc.scad>
use <../p/axle.scad>
$fa=1; $fs=0.2;
function ldraw_lib__87083(realsolid=false) = [
// 0 Technic Axle  4 with Stop
// 0 Name: 87083.dat
// 0 Author: Philippe Hurbain [Philo]
// 0 !LDRAW_ORG Part UPDATE 2010-01
// 0 !LICENSE Licensed under CC BY 2.0 and CC BY 4.0 : see CAreadme.txt
// 
// 0 BFC CERTIFY CCW
  [0,"BFC","CERTIFY"],
  [0,"BFC","CCW"],
// 
// 0 !HISTORY 2010-04-05 [PTadmin] Official Update 2010-01
// 
// 
// 1 16 38 0 0 0 -78 0 1 0 0 0 0 1 axle.dat
  [1,16,38,0,0,0,-78,0,1,0,0,0,0,1, ldraw_lib__axle(realsolid)],
// 1 16 38 0 0 0 1 0 8 0 0 0 0 8 4-4disc.dat
  [1,16,38,0,0,0,1,0,8,0,0,0,0,8, ldraw_lib__4_4disc(realsolid)],
// 1 16 40 0 0 0 -2 0 8 0 0 0 0 8 4-4cylc.dat
  [1,16,40,0,0,0,-2,0,8,0,0,0,0,8, ldraw_lib__4_4cylc(realsolid)],
];
module ldraw_lib__87083(step=0, col=false, unit=2/5, alt=false, line=0.2, solid=!$preview)
    makepoly(ldraw_lib__87083(solid), step=step, col=col, unit=unit, alt=alt, line=line, solid=solid);
ldraw_lib__87083(line=0.2);
